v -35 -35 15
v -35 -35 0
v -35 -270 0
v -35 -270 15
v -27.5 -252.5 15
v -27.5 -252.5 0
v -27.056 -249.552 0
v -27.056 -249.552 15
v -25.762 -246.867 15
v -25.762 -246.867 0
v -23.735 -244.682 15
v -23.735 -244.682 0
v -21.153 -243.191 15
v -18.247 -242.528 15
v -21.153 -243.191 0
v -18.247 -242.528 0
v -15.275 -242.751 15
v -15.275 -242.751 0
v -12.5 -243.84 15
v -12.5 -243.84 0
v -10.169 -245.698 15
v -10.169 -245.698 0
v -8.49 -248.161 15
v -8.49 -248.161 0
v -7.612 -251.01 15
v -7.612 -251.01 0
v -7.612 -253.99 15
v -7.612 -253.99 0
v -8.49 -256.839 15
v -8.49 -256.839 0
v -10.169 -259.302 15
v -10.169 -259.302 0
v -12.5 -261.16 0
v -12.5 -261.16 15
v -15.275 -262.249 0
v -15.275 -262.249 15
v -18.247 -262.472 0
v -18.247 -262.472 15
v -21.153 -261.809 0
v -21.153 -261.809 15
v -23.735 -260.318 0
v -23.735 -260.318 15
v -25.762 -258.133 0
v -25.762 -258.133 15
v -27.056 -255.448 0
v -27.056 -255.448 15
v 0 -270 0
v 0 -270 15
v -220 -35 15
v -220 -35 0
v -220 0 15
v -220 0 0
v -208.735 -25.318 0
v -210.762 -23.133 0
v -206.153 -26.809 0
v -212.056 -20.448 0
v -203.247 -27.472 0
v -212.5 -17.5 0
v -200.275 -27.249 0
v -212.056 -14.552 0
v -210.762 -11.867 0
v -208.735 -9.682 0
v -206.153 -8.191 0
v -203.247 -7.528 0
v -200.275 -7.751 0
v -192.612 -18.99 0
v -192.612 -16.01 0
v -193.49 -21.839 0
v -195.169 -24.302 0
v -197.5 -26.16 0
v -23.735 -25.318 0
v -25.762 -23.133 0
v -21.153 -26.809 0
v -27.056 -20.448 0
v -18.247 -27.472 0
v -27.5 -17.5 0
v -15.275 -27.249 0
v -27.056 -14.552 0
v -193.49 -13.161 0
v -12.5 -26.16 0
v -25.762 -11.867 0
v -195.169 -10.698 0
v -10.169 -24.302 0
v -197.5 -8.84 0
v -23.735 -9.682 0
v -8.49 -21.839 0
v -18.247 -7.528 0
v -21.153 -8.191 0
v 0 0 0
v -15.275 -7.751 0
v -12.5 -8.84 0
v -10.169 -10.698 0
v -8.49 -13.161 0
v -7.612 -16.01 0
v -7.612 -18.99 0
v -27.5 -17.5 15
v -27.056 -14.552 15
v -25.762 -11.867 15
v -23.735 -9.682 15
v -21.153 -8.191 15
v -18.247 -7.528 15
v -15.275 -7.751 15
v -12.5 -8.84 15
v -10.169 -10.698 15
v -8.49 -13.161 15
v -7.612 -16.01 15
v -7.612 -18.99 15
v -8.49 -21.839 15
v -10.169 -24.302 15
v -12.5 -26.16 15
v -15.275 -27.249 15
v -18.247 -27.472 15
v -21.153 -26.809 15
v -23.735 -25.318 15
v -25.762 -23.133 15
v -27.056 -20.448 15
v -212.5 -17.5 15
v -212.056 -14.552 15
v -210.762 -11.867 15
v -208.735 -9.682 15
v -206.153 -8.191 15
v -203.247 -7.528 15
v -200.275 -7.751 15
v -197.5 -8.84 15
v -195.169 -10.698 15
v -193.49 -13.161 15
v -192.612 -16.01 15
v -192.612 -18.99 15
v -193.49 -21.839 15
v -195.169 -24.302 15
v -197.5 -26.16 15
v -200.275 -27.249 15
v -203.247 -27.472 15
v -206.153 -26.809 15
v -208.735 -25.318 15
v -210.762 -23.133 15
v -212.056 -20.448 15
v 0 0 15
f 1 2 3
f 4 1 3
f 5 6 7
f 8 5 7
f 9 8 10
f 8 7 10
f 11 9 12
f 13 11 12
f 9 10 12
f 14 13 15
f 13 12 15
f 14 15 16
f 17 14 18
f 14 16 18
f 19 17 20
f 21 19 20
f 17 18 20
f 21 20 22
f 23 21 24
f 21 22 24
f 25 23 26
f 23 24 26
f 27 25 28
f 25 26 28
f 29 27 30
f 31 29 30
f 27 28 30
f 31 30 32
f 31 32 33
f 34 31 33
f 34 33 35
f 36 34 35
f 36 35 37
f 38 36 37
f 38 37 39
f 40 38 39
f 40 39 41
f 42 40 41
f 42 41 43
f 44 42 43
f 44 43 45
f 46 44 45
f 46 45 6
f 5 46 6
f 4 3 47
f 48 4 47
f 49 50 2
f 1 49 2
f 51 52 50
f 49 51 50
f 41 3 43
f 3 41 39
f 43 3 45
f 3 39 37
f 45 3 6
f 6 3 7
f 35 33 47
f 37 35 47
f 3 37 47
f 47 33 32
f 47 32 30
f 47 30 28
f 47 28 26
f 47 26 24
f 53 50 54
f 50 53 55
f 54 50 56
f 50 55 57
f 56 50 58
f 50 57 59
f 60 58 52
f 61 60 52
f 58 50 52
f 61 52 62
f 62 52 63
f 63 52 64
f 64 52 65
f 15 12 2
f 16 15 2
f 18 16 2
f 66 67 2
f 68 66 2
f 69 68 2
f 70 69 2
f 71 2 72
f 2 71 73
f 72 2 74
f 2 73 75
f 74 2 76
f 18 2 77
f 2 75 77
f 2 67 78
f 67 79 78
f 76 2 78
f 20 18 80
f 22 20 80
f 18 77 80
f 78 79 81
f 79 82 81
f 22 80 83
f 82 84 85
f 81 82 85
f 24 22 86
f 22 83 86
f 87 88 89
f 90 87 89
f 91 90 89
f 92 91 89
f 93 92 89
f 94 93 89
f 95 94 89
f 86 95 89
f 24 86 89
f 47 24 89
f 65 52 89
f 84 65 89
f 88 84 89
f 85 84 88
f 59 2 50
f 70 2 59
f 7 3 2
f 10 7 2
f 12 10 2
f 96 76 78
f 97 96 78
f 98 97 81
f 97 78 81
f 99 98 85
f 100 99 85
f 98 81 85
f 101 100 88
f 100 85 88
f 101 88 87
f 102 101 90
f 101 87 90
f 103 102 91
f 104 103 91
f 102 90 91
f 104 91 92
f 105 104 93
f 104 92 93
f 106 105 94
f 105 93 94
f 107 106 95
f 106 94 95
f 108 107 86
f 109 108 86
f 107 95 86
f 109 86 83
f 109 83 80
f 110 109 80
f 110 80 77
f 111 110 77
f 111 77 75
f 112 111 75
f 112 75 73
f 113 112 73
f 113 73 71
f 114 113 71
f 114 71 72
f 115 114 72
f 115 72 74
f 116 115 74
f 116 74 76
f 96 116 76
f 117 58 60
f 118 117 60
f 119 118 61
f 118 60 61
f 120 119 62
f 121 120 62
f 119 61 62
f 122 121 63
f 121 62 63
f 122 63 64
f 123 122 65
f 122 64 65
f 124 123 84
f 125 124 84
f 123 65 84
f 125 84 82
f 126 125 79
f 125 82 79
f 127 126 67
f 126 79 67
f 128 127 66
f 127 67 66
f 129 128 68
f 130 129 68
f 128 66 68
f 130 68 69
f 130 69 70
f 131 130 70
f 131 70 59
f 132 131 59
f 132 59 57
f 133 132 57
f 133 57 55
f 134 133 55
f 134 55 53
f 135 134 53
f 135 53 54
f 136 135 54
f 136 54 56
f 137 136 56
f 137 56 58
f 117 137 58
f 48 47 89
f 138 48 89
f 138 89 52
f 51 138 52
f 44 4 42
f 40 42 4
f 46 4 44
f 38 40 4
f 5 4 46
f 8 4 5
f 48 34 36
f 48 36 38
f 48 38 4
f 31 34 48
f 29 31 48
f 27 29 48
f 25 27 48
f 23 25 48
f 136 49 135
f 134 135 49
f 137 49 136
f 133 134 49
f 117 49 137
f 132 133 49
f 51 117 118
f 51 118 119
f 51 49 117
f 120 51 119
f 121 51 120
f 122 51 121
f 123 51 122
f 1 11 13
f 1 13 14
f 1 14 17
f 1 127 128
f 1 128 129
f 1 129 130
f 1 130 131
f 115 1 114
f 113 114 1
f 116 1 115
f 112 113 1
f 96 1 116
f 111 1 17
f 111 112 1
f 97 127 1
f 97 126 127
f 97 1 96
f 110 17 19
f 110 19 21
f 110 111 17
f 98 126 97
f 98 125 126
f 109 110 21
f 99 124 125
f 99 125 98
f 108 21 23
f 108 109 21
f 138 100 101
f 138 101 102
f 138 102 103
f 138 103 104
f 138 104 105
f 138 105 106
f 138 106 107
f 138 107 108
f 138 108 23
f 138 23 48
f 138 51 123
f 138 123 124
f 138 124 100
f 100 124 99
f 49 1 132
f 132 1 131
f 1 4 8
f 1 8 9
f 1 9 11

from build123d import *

# Parameters (mm, degrees)
BOSS_EXTRUDE1_DEPTH        = 15
F_20_0MM_DOWEL_HOLE2_D     = 20
F_20_0MM_DOWEL_HOLE2_DEPTH = 22.25
F_20_0MM_DOWEL_HOLE2_TIP   = 6.00860619
F_20_0MM_DOWEL_HOLE1_D     = 20
F_20_0MM_DOWEL_HOLE1_DEPTH = 22.25
F_20_0MM_DOWEL_HOLE1_TIP   = 6.00860619


with BuildPart() as part:
    # Sketch1 → Boss-Extrude1 (new body)
    with BuildSketch(Plane.XY):
        Polygon((0, 0), (-220, 0), (-220, -35), (-35, -35), (-35, -270), (0, -270), align=None)
    extrude(amount=BOSS_EXTRUDE1_DEPTH)

    # Ø20.0mm Dowel Hole2
    with Locations(Plane.XY.offset(15)):
        with Locations((-17.5, -17.5), (-202.5, -17.5), (-17.5, -252.5)):
            Hole(F_20_0MM_DOWEL_HOLE2_D / 2, depth=F_20_0MM_DOWEL_HOLE2_DEPTH)
            with Locations((0, 0, -(F_20_0MM_DOWEL_HOLE2_DEPTH + F_20_0MM_DOWEL_HOLE2_TIP / 2))):  # 118° drill point
                Cone(0, F_20_0MM_DOWEL_HOLE2_D / 2, F_20_0MM_DOWEL_HOLE2_TIP, mode=Mode.SUBTRACT)

    # Ø20.0mm Dowel Hole1
    with Locations(Plane.XY.offset(15)):
        with Locations((-17.5, -17.5), (-202.5, -17.5), (-17.5, -252.5)):
            Hole(F_20_0MM_DOWEL_HOLE1_D / 2, depth=F_20_0MM_DOWEL_HOLE1_DEPTH)
            with Locations((0, 0, -(F_20_0MM_DOWEL_HOLE1_DEPTH + F_20_0MM_DOWEL_HOLE1_TIP / 2))):  # 118° drill point
                Cone(0, F_20_0MM_DOWEL_HOLE1_D / 2, F_20_0MM_DOWEL_HOLE1_TIP, mode=Mode.SUBTRACT)


solid = part.part
